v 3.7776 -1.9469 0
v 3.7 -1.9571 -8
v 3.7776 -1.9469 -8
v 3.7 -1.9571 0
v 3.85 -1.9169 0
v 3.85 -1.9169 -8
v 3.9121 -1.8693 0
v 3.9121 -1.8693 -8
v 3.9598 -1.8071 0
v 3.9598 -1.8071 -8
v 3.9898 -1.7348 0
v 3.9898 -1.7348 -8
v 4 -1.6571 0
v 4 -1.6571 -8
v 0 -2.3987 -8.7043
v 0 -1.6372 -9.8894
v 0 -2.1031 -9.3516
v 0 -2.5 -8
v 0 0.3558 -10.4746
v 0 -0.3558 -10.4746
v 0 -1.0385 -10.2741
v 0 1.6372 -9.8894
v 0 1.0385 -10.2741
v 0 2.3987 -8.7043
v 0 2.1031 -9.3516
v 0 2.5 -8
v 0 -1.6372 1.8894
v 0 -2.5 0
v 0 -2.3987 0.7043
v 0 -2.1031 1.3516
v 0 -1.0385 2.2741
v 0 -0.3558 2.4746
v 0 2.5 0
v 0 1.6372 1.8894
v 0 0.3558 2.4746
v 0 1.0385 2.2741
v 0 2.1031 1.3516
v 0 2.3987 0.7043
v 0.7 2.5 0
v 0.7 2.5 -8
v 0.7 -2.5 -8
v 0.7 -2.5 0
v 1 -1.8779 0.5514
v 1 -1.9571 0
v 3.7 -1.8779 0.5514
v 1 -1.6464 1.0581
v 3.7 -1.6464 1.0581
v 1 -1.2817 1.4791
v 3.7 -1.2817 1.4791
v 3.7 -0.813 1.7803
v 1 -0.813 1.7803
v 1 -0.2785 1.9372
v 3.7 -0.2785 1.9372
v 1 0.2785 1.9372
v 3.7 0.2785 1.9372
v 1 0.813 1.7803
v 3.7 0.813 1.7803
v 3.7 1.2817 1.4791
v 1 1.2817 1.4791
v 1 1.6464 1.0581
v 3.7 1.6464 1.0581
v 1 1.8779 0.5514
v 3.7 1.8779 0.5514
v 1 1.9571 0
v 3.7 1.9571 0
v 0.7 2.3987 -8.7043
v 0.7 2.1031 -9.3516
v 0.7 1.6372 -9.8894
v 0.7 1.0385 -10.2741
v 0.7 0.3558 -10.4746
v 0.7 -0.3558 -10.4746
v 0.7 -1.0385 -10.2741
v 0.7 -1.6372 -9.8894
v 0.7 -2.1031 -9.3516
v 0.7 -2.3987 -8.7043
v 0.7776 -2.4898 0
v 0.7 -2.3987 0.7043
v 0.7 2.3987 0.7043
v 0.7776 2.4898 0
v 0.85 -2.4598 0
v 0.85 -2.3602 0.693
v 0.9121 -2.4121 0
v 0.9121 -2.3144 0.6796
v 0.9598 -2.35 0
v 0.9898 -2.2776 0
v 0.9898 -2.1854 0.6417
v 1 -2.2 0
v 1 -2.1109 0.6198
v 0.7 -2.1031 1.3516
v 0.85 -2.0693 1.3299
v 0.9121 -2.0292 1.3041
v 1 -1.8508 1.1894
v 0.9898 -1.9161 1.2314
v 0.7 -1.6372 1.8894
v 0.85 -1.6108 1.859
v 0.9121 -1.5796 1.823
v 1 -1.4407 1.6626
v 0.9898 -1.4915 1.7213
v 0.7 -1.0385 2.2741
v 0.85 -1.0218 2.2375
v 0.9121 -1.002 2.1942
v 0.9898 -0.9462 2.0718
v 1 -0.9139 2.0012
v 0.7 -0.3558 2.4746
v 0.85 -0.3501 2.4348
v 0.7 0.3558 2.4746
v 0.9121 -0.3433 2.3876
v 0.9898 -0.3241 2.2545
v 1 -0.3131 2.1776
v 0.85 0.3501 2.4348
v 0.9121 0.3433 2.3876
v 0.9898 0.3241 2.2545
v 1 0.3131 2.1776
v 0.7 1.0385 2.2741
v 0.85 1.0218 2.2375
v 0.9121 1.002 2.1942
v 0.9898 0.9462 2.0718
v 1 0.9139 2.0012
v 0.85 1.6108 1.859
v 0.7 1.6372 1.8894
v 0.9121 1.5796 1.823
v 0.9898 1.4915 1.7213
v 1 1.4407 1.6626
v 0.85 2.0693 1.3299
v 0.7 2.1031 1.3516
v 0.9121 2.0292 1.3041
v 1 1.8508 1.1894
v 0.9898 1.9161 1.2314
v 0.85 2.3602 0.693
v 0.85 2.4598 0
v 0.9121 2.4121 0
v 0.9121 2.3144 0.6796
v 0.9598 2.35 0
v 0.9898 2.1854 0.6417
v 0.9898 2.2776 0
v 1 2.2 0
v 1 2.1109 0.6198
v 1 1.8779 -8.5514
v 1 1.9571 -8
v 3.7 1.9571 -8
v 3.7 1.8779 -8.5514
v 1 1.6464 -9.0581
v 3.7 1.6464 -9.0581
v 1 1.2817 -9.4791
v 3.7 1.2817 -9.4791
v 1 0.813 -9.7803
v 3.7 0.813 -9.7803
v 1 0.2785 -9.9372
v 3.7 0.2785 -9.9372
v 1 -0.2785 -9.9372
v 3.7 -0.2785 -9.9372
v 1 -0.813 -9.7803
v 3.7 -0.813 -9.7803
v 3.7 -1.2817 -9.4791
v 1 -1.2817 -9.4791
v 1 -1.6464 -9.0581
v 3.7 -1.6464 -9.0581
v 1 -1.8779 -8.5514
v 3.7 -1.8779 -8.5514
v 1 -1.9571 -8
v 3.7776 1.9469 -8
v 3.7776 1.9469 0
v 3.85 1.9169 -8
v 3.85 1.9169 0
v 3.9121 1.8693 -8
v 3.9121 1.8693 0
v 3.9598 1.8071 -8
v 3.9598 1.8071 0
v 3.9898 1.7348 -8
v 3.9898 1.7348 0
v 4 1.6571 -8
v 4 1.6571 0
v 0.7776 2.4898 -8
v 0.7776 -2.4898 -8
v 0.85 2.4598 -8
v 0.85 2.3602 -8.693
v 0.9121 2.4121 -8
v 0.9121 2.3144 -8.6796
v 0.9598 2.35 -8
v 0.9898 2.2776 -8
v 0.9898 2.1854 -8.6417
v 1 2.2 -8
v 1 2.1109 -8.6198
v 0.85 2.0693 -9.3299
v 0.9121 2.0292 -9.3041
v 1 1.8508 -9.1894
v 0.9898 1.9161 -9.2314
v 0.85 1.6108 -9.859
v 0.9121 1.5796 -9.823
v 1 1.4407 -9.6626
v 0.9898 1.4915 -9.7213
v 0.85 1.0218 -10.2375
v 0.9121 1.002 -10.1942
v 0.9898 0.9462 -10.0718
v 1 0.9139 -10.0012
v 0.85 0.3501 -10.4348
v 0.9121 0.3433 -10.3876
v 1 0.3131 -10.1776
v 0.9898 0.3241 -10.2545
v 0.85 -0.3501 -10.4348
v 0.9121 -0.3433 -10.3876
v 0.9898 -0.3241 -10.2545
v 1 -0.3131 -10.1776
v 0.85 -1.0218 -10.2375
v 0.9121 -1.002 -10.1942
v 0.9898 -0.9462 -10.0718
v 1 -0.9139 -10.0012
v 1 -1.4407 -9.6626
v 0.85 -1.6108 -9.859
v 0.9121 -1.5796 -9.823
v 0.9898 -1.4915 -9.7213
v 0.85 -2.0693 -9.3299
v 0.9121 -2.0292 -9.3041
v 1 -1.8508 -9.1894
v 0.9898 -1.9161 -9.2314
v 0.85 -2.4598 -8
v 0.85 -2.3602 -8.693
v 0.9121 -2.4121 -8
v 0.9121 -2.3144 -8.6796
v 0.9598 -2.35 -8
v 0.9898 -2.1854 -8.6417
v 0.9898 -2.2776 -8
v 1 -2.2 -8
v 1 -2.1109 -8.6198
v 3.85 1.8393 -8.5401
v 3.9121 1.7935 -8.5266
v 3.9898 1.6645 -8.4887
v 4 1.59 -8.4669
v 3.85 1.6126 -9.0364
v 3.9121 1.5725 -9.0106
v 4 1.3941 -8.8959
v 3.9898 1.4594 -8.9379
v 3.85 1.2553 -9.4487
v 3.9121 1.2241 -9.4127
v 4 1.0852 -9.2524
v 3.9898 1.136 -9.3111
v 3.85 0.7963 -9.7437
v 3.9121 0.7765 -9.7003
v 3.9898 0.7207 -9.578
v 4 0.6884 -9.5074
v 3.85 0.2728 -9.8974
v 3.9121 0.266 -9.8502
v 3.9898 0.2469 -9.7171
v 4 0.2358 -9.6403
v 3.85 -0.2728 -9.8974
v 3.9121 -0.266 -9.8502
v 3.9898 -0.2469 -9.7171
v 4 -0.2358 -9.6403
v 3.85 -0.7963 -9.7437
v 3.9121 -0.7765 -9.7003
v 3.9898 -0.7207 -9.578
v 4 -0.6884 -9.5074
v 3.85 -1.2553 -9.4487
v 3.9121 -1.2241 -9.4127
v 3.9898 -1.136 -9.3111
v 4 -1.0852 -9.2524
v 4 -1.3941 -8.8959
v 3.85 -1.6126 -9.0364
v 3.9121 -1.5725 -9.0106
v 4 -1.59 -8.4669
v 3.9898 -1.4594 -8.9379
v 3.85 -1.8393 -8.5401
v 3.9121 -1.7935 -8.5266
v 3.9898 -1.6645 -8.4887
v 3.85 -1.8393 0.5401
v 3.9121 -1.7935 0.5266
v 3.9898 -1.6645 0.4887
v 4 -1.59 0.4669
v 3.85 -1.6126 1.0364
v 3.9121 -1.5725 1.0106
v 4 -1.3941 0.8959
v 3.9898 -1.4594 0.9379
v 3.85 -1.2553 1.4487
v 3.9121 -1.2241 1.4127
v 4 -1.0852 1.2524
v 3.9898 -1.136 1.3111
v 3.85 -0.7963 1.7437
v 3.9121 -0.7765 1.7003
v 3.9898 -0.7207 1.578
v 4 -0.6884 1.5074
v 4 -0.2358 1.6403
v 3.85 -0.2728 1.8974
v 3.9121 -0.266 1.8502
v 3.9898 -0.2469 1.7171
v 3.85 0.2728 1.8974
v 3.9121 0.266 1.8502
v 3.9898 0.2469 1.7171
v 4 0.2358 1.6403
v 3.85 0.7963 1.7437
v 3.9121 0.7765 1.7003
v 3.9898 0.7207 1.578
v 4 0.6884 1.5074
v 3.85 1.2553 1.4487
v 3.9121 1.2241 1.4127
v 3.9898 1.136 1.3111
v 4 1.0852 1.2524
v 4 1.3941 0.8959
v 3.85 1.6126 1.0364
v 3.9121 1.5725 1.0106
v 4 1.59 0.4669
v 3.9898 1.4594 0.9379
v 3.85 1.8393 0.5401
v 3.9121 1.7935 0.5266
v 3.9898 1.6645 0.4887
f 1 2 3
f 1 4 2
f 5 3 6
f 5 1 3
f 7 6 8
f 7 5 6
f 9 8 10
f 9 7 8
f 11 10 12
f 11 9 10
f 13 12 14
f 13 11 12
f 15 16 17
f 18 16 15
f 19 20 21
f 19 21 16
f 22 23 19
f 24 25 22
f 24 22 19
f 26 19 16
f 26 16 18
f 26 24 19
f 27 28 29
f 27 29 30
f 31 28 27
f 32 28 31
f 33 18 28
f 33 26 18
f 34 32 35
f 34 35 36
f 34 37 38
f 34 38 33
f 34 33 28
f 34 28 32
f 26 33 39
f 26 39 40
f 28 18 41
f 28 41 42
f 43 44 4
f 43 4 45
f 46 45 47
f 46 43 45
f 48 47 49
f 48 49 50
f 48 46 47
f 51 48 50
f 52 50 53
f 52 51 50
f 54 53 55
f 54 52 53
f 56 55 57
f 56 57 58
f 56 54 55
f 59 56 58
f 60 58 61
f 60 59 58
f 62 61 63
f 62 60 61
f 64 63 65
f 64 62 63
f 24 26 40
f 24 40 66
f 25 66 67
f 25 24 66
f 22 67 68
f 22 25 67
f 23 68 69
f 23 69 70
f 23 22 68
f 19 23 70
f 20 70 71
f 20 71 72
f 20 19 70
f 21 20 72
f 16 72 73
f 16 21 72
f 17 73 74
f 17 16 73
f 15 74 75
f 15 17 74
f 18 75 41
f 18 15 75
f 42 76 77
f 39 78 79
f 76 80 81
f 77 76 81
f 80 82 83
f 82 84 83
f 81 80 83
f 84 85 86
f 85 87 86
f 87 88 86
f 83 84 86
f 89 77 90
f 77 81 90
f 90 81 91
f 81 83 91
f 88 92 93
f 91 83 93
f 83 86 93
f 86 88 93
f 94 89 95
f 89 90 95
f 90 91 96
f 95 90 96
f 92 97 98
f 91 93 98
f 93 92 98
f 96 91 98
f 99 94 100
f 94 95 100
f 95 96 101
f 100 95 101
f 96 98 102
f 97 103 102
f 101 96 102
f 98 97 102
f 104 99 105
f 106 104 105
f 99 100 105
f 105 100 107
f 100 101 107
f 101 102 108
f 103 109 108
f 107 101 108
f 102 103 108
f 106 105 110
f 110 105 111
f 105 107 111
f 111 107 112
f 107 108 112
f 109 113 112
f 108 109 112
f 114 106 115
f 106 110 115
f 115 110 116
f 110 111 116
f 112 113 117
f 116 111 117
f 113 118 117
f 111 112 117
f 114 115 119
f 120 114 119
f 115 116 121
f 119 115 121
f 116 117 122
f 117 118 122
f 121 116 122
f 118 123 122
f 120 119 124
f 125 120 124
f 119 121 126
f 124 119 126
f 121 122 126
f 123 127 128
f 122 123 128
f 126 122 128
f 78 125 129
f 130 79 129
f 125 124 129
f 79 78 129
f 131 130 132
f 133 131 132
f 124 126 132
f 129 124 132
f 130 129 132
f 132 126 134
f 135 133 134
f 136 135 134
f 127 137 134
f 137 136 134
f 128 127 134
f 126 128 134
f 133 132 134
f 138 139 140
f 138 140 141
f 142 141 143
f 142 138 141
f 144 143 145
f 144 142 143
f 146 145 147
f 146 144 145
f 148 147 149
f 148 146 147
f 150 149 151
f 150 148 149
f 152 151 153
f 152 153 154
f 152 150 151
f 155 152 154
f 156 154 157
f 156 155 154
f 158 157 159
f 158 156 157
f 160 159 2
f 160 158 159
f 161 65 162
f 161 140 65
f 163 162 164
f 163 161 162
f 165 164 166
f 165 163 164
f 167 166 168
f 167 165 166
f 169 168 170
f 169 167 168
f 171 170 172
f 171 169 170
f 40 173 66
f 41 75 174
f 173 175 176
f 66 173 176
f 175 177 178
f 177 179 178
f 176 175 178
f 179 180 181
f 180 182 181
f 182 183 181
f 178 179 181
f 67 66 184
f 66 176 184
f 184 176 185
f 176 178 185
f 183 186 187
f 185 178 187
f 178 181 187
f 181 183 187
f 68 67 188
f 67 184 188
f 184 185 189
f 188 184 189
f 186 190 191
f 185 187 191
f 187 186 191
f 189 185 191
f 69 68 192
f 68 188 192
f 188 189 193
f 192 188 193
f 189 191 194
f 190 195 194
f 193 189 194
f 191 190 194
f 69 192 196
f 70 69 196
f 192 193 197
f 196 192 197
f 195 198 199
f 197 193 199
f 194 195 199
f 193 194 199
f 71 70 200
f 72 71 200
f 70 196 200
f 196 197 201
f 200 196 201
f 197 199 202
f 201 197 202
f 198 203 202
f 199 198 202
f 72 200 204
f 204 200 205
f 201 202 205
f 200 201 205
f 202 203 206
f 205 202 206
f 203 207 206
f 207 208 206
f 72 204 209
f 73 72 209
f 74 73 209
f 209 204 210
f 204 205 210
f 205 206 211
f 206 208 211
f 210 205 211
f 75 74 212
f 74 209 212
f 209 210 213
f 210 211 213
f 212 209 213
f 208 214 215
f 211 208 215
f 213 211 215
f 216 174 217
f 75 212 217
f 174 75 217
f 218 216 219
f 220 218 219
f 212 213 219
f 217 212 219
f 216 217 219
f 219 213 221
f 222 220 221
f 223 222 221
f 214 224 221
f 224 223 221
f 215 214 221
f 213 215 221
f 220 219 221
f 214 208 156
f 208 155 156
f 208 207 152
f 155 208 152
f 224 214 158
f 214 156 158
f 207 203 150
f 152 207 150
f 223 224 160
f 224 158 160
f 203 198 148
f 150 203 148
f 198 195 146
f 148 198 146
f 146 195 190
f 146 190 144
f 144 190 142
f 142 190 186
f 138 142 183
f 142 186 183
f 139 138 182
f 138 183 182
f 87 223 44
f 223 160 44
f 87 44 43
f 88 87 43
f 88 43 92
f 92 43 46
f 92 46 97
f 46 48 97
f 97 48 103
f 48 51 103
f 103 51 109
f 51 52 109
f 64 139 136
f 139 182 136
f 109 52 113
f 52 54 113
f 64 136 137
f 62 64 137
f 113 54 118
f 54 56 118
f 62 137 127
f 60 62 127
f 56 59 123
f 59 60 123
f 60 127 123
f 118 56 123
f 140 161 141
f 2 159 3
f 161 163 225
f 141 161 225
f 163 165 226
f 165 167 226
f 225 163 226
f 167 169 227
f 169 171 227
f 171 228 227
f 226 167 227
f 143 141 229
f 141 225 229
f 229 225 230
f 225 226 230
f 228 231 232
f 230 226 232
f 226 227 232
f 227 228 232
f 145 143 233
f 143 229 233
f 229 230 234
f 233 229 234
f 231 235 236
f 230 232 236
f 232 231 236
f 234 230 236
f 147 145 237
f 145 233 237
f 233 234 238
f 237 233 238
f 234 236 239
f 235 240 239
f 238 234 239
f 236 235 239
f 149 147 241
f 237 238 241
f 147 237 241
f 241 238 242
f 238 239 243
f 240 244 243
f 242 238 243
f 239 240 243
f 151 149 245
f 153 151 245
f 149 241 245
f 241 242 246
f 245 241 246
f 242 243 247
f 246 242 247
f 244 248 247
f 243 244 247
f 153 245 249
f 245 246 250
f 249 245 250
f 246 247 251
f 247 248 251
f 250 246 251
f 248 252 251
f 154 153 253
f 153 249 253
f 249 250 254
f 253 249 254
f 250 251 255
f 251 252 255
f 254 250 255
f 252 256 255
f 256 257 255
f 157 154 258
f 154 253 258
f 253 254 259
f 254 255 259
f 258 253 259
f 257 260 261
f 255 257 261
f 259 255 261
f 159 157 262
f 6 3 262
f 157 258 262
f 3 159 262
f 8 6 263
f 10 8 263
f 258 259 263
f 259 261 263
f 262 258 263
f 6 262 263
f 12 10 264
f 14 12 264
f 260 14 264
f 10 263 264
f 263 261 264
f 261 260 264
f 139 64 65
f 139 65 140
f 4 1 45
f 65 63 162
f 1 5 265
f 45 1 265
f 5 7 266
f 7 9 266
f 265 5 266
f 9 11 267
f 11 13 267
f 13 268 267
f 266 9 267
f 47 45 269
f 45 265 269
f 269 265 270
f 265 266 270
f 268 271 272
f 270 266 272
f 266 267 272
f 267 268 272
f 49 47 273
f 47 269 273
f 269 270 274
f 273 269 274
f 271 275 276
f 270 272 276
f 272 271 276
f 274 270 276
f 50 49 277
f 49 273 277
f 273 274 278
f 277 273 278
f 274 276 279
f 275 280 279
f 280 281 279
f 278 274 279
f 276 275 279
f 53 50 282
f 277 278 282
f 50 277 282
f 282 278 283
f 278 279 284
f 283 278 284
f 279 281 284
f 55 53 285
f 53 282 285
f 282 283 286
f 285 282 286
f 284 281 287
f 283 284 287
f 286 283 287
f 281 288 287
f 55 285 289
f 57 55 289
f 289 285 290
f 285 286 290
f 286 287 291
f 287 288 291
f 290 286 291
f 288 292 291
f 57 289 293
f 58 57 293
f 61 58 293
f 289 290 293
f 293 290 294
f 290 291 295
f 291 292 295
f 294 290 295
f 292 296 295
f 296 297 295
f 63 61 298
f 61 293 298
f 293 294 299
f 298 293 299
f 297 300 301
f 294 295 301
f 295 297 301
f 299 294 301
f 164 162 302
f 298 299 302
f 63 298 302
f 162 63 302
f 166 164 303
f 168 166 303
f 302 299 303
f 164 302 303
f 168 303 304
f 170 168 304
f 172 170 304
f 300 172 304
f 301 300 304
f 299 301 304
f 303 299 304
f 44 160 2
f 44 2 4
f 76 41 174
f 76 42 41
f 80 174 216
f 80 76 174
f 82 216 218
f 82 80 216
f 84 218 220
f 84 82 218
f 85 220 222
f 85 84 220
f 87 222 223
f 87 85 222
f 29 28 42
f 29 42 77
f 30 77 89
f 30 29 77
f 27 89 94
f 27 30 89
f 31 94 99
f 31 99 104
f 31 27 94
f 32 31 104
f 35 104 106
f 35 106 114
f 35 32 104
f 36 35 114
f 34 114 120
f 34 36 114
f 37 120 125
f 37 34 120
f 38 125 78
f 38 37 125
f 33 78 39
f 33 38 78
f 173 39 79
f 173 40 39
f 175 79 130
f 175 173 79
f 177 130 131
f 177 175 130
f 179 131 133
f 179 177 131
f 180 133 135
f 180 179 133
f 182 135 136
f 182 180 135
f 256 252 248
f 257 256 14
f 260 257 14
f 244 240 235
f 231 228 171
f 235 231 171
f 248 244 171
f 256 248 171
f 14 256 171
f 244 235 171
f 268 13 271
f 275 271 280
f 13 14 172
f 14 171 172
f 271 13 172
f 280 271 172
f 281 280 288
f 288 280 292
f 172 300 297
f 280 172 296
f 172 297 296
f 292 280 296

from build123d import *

# Parameters (mm, degrees)
EXTRUDE_1_DEPTH = 1
EXTRUDE_2_DEPTH = 3
FILLET_1_R      = 0.3


with BuildPart() as part:
    # 草图1 → 凸台-拉伸1 (new body)
    with BuildSketch(Plane(origin=(0, 0, 0), x_dir=(0, 0, -1), z_dir=(1, 0, 0))):
        with BuildLine():
            Line((0, 2.5), (8, 2.5))
            ThreePointArc((8, 2.5), (10.5, 0), (8, -2.5))
            Line((8, -2.5), (0, -2.5))
            ThreePointArc((0, -2.5), (-2.5, 0), (0, 2.5))
        make_face()
    extrude(amount=EXTRUDE_1_DEPTH)

    # 草图2 → 凸台-拉伸2 (add)
    with BuildSketch(Plane(origin=(1, 0, 0), x_dir=(0, 0, -1), z_dir=(1, 0, 0))):
        with BuildLine():
            Line((0, 1.957135809), (8, 1.957135809))
            ThreePointArc((8, 1.957135809), (9.957135809, 0), (8, -1.957135809))
            Line((8, -1.957135809), (0, -1.957135809))
            ThreePointArc((0, -1.957135809), (-1.957135809, 0), (0, 1.957135809))
        make_face()
    extrude(amount=EXTRUDE_2_DEPTH)

    # 圆角1
    fillet_1_edges = [part.edges().sort_by_distance(p)[0] for p in [
        (1, 0, -10.5),
        (1, 2.5, -4),
        (4, 0, 1.957135809),
        (4, -1.957135809, -4),
        (4, 0, -9.957135809),
        (4, 1.957135809, -4),
        (1, 0, 2.5),
        (1, -2.5, -4),
    ]]
    fillet(fillet_1_edges, radius=FILLET_1_R)


solid = part.part
